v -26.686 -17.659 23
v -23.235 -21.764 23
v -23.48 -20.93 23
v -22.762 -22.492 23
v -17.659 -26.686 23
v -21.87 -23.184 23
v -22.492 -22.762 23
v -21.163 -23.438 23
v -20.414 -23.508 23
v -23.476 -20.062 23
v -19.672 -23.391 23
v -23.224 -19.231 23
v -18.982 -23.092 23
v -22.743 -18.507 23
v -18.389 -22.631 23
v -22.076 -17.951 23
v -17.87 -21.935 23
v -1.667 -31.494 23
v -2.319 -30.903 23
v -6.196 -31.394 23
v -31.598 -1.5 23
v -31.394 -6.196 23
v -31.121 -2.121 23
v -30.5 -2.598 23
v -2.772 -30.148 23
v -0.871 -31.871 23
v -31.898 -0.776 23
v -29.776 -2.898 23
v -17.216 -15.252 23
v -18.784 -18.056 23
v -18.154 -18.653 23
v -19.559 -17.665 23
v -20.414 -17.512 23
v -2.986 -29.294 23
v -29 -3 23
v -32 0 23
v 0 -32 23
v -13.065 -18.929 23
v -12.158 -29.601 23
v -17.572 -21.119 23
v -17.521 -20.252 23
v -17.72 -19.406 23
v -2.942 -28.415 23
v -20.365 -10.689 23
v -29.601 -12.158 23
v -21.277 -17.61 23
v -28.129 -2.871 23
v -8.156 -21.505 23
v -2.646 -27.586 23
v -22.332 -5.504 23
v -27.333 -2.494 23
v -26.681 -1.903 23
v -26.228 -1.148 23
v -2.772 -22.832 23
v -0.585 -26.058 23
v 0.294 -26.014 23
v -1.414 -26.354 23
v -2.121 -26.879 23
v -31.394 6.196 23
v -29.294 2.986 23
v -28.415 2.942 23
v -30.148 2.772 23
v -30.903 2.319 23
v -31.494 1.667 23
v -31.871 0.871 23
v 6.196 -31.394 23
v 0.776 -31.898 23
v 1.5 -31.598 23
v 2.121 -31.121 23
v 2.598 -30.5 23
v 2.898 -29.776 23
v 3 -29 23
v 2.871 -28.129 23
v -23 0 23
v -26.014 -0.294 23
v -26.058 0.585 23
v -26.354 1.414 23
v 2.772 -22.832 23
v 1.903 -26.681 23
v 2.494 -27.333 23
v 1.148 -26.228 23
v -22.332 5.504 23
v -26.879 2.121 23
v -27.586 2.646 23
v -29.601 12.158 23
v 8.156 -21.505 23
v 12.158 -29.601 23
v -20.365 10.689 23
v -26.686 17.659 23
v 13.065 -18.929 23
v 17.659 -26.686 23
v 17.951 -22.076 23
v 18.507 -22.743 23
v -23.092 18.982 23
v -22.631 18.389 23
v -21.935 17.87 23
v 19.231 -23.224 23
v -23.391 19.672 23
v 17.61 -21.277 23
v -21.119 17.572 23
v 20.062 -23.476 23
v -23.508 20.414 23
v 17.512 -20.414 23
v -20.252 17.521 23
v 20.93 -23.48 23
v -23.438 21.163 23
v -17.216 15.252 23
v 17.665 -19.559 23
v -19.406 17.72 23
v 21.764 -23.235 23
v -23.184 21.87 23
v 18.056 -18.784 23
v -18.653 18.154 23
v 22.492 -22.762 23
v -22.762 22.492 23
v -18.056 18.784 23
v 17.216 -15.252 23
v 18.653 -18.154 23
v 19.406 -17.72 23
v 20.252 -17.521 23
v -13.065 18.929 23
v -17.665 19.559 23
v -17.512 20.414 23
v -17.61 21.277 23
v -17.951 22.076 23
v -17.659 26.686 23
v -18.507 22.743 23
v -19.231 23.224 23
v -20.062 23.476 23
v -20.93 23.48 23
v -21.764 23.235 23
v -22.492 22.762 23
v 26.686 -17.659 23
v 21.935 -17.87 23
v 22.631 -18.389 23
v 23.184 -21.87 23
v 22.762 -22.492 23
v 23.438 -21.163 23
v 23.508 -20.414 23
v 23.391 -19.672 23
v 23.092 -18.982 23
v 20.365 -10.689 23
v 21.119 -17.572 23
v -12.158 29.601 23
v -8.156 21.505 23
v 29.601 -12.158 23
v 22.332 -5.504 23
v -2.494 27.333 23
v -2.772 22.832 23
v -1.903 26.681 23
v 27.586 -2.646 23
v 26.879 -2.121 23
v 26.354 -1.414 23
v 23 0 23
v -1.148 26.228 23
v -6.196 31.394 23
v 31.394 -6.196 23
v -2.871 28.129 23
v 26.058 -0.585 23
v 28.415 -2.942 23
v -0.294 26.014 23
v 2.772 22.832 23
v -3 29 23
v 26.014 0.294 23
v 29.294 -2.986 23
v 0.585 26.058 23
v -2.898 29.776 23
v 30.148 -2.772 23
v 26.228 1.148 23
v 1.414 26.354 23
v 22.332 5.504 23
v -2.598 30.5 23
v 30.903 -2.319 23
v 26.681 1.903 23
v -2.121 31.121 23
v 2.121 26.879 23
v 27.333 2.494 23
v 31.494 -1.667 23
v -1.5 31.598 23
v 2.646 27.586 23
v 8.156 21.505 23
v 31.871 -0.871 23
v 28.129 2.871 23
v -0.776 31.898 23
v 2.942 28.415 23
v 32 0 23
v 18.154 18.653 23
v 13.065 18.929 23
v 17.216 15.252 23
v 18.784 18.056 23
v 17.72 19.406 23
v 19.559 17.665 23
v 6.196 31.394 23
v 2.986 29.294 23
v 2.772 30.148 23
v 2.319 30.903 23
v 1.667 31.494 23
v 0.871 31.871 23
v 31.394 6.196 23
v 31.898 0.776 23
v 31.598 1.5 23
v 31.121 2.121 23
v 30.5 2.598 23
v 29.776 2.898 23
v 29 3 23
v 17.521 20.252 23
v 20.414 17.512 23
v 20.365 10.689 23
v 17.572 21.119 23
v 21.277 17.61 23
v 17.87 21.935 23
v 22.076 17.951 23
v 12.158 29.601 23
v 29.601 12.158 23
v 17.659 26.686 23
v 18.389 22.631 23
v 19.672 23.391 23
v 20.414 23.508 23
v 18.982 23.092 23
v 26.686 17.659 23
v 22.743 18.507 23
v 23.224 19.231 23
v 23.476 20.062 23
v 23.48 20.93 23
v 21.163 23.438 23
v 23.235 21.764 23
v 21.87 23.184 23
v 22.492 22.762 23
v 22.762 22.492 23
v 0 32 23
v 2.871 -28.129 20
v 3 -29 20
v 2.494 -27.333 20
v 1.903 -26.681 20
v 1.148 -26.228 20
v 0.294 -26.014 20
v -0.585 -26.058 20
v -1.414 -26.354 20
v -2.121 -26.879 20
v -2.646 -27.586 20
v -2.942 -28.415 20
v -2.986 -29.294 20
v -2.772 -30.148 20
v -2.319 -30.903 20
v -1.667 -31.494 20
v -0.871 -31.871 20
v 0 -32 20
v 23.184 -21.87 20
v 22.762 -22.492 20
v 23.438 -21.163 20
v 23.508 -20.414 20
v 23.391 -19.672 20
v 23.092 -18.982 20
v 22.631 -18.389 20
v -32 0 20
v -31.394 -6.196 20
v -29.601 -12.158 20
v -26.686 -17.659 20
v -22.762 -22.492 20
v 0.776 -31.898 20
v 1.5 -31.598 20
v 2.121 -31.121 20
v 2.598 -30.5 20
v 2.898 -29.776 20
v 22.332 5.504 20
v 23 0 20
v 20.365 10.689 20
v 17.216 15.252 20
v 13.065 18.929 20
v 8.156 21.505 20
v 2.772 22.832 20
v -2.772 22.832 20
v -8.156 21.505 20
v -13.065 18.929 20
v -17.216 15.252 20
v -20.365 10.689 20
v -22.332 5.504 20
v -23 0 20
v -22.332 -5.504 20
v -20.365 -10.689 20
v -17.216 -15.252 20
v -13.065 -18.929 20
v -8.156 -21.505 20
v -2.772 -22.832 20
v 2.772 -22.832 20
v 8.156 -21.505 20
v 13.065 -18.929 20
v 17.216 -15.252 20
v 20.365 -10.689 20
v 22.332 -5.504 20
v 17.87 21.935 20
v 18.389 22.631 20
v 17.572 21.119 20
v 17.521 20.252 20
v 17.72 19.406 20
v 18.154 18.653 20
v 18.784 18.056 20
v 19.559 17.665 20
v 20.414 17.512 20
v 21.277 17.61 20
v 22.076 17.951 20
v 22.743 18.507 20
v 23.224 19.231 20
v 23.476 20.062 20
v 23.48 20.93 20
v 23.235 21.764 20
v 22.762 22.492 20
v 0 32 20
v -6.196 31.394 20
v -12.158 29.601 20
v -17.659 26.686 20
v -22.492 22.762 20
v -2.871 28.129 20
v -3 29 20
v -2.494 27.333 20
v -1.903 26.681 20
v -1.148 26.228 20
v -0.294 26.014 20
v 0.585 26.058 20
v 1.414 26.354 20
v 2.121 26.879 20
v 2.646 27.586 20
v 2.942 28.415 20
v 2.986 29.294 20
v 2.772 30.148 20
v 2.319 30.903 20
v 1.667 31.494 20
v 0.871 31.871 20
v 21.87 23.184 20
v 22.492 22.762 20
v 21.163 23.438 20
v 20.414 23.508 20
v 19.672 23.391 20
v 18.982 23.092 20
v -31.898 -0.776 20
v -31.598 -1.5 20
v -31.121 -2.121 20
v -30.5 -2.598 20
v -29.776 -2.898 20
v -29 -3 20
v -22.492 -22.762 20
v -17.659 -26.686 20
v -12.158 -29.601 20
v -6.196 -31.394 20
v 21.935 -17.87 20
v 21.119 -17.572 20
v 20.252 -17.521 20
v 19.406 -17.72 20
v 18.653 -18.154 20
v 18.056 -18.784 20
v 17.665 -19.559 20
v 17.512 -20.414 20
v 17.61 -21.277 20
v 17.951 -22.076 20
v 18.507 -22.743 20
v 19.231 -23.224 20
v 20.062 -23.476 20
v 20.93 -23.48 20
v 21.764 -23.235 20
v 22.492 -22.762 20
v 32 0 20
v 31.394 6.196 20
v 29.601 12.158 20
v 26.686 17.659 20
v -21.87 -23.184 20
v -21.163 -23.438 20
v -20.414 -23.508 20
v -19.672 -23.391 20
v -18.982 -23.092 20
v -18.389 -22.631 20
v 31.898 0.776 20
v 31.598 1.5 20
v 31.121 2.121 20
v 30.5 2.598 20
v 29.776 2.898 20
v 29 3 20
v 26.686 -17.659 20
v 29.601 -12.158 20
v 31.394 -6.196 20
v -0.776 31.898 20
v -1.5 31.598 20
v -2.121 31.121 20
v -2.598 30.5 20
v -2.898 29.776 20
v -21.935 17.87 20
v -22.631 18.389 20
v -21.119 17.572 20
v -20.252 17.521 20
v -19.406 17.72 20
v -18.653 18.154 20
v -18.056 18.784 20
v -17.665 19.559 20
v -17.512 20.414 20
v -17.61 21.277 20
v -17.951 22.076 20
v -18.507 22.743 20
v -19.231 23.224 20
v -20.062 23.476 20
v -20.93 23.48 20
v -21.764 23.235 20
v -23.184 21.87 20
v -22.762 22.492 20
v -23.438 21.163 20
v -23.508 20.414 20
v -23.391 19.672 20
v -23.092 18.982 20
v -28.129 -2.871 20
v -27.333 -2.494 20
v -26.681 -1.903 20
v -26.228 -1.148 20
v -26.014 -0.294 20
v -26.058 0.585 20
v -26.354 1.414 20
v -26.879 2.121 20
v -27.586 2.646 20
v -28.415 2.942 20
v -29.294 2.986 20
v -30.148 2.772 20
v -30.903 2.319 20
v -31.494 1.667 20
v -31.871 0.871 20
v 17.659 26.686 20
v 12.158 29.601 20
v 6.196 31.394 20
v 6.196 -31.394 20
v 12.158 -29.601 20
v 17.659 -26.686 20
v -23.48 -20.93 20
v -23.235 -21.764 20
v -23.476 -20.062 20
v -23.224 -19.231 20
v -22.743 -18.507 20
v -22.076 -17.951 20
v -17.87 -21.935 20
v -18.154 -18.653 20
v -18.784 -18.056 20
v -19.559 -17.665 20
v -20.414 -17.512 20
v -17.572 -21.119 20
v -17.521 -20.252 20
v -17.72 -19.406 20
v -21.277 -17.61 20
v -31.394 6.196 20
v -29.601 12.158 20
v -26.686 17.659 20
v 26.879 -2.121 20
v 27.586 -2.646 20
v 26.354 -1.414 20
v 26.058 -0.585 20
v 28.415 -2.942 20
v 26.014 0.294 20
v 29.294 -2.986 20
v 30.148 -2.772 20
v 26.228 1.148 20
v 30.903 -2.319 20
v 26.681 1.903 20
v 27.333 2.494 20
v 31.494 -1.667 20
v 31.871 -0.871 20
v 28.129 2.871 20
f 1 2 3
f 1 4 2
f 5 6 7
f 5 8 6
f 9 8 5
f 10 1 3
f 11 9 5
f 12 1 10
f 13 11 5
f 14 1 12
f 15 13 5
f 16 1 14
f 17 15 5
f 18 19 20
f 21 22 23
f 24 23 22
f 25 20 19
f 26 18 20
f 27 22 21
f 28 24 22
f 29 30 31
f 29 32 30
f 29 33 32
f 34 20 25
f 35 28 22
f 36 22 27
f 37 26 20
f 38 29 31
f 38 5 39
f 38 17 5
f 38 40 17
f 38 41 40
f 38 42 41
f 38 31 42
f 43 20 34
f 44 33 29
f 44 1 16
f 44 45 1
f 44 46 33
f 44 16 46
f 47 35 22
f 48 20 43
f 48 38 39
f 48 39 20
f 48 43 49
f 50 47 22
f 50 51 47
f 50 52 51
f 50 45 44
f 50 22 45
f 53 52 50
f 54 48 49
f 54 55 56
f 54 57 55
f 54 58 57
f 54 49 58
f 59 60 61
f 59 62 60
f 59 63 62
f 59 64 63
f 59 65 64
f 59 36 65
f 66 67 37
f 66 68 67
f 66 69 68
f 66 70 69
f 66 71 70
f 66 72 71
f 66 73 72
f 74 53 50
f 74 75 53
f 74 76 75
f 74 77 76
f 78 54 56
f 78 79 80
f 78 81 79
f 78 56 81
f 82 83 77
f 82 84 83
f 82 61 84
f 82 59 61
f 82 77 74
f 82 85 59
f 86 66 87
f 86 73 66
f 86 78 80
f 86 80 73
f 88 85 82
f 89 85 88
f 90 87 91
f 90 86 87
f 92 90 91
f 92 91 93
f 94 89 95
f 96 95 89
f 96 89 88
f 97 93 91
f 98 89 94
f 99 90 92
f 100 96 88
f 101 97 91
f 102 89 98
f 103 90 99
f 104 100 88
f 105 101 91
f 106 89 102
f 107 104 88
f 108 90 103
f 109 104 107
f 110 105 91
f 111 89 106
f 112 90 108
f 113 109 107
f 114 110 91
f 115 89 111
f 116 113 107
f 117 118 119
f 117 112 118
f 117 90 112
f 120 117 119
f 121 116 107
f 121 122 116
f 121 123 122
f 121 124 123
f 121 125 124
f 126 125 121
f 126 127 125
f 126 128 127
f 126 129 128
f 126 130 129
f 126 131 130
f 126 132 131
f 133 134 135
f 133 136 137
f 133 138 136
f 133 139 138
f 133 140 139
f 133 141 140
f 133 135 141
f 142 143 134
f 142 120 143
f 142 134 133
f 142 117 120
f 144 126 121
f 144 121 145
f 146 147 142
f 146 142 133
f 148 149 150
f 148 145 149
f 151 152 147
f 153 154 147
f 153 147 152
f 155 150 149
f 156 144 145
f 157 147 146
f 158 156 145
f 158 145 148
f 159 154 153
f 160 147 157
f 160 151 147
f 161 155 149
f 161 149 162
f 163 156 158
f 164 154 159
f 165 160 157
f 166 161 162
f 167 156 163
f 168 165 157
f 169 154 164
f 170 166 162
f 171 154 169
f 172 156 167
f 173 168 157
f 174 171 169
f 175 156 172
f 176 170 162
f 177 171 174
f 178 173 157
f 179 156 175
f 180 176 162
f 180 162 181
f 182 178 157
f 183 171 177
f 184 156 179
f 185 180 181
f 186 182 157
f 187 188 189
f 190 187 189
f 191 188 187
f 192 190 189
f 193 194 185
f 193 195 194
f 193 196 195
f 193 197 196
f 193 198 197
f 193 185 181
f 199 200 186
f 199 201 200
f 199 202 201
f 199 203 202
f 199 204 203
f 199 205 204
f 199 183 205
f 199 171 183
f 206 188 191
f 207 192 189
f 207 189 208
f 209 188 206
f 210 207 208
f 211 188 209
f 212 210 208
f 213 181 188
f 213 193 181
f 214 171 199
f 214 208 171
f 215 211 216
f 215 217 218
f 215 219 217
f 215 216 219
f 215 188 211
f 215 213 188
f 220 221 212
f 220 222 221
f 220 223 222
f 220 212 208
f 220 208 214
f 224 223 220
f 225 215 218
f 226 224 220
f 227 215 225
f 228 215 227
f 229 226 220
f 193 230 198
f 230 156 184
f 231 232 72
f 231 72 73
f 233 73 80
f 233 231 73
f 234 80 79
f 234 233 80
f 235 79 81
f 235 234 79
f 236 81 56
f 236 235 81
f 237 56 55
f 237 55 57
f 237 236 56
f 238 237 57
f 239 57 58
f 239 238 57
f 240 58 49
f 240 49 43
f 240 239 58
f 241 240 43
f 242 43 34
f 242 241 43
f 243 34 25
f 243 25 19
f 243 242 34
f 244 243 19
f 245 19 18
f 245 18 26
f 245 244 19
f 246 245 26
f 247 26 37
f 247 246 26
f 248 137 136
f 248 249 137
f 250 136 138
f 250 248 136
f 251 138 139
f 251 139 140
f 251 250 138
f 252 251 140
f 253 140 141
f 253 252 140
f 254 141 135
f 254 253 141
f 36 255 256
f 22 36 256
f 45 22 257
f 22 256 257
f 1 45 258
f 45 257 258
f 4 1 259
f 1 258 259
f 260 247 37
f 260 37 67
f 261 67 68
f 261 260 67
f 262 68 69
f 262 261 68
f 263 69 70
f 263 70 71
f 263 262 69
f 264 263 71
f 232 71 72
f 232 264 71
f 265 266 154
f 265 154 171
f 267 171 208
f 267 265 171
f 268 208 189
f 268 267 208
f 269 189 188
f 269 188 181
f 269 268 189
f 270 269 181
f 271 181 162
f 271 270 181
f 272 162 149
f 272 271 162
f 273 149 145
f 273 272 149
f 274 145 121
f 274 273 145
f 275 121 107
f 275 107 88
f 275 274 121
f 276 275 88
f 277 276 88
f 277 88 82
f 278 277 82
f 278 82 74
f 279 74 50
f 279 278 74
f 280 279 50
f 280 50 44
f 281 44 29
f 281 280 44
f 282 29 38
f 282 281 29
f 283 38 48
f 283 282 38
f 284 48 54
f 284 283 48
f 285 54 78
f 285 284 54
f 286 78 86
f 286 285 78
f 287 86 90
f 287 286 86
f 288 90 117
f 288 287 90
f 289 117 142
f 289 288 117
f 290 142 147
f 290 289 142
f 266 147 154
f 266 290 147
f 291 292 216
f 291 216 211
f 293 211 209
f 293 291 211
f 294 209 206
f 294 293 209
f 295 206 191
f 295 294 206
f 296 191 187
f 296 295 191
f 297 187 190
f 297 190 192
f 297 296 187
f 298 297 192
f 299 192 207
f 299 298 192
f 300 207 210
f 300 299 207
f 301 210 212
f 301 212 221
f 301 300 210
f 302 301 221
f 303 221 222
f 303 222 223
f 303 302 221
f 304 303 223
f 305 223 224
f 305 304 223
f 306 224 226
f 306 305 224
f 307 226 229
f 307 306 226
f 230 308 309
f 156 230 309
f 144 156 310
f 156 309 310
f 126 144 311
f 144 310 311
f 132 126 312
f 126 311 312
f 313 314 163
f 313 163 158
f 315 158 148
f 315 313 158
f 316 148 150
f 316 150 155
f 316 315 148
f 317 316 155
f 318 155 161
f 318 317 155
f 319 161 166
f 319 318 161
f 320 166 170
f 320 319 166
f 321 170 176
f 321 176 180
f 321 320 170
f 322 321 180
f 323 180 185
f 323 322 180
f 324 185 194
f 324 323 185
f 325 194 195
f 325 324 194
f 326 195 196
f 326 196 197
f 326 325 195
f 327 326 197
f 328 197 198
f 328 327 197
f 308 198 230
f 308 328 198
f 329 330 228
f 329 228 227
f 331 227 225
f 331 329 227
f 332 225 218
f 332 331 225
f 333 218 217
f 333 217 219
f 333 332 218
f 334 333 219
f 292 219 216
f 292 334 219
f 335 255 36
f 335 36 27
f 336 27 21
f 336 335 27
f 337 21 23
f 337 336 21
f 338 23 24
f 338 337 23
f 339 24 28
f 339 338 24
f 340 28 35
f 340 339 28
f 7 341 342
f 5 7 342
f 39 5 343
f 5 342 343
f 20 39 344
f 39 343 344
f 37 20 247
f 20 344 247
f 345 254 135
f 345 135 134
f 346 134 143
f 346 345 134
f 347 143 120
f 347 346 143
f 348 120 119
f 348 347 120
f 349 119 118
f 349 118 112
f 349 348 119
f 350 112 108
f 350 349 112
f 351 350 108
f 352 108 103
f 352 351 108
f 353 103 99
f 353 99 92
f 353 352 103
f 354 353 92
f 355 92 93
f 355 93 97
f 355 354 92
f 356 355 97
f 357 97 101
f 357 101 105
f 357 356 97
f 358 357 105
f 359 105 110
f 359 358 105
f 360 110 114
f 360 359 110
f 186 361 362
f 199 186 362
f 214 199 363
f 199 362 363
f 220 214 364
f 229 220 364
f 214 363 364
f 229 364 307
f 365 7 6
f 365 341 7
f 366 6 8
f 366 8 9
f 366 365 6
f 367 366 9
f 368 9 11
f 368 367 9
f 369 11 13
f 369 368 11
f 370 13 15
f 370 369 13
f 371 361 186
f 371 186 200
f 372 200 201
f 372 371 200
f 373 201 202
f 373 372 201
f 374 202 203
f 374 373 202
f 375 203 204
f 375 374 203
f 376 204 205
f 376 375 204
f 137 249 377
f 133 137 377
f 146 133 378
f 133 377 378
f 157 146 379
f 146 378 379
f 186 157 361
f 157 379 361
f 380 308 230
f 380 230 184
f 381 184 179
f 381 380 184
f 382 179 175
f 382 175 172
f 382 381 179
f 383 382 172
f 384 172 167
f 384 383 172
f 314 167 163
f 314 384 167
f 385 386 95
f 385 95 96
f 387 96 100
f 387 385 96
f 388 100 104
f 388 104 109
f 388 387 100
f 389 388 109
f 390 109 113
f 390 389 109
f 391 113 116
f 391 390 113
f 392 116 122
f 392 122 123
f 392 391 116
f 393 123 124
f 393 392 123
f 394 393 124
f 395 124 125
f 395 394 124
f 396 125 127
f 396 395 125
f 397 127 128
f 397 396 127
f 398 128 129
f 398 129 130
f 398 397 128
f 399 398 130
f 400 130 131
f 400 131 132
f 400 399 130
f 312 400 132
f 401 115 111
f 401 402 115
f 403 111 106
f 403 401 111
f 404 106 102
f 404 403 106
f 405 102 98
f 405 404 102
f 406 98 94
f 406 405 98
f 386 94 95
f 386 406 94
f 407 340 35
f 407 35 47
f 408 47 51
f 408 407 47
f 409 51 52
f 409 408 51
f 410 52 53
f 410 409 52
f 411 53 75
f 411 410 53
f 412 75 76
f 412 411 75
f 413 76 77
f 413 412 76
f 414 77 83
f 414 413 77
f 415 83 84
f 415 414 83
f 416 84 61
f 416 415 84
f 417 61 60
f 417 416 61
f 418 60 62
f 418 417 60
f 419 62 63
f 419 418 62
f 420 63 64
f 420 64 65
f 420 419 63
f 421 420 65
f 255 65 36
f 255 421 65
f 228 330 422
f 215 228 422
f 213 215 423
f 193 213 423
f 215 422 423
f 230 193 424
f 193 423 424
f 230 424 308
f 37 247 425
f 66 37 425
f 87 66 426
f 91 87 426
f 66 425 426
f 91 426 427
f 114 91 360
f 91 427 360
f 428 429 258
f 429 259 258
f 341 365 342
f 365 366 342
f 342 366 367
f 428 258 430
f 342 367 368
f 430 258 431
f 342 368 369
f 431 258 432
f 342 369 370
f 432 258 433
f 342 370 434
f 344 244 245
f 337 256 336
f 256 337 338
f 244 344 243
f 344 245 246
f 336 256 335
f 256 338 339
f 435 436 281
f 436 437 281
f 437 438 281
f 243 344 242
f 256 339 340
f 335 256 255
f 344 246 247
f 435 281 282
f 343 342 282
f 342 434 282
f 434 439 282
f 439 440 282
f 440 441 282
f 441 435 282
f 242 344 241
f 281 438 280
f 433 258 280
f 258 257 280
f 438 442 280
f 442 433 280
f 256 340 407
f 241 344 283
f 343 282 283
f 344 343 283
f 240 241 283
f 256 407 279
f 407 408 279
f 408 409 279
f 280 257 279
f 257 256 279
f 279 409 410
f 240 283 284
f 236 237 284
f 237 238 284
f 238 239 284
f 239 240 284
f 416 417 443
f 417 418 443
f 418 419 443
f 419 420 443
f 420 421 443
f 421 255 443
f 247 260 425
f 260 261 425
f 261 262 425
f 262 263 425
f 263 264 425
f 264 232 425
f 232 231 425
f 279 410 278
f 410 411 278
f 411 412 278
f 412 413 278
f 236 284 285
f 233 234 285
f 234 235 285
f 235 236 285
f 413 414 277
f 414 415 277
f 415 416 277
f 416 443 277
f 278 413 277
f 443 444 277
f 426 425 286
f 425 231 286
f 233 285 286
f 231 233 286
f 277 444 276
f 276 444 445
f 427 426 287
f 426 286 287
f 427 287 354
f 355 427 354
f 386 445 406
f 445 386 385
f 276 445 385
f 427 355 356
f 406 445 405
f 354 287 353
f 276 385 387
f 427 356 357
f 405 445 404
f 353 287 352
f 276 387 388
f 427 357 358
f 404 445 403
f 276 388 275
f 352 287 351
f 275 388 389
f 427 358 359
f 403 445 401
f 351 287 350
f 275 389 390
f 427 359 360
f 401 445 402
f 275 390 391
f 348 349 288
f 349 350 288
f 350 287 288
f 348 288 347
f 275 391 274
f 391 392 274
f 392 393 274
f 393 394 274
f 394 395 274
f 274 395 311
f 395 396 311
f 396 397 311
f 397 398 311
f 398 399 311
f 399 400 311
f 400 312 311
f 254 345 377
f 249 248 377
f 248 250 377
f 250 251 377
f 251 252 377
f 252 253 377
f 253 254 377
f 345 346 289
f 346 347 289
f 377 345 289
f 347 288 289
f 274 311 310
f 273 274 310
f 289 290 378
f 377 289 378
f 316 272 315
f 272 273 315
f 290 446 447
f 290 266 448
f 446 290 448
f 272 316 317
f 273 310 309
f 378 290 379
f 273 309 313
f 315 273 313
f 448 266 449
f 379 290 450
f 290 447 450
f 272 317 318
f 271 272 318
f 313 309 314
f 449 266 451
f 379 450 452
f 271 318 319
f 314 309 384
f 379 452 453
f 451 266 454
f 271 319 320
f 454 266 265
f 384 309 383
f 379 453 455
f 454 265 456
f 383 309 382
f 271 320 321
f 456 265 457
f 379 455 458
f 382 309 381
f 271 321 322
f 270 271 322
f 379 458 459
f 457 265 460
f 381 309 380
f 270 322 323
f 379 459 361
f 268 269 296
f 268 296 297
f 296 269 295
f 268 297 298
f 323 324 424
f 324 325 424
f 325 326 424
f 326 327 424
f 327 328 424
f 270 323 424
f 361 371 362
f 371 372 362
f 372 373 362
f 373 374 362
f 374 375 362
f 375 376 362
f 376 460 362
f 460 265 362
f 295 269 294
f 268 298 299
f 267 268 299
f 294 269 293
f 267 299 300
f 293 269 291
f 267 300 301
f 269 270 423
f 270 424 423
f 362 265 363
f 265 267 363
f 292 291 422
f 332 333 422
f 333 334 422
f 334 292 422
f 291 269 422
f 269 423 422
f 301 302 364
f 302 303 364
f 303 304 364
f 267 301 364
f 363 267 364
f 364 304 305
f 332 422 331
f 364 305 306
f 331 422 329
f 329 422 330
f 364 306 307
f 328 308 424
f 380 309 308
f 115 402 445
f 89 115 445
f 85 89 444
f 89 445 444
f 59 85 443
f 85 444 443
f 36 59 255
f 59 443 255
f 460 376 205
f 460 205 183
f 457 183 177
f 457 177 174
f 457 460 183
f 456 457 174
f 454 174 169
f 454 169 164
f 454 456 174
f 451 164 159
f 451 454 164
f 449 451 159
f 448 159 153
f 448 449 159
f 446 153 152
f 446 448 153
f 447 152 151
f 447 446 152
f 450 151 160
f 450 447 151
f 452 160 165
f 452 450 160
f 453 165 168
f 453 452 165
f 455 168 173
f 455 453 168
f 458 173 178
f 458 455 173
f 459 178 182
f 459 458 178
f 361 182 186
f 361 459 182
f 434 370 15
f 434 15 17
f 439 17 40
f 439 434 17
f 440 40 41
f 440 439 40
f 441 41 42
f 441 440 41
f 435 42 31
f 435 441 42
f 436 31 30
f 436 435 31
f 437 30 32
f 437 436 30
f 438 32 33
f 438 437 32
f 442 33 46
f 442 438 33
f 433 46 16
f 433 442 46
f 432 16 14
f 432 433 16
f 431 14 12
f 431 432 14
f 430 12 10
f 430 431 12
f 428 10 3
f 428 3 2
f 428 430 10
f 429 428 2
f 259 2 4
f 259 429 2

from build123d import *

# Parameters (mm, degrees)
CYLINDER206_R               = 3
CYLINDER206_DEPTH           = 3
CYLINDER206_PLACEMENT_ANGLE = 45
CYLINDER203_R               = 3
CYLINDER203_DEPTH           = 3
CYLINDER205_R               = 3
CYLINDER205_DEPTH           = 3
CYLINDER205_PLACEMENT_ANGLE = 135
CYLINDER207_R               = 3
CYLINDER207_DEPTH           = 3
CYLINDER208_R               = 3
CYLINDER208_DEPTH           = 3
CYLINDER208_PLACEMENT_ANGLE = 225
CYLINDER209_R               = 3
CYLINDER209_DEPTH           = 3
CYLINDER210_R               = 3
CYLINDER210_DEPTH           = 3
CYLINDER210_PLACEMENT_ANGLE = 45
CYLINDER204_R               = 3
CYLINDER204_DEPTH           = 3
TUBE013_R                   = 32
TUBE013_R_2                 = 23
TUBE013_DEPTH               = 3


with BuildPart() as v_lec206:
    # Cylinder206 → Cylinder206 (new body)
    with BuildSketch(Plane.XY):
        Circle(CYLINDER206_R)
    extrude(amount=CYLINDER206_DEPTH)


with BuildPart() as v_lec206_1:
    # Cylinder206 placement: moved
    add(v_lec206.part.moved(Location((20.51, -20.51, 20))).rotate(Axis((20.51, -20.51, 20), (0, 0, 1)), CYLINDER206_PLACEMENT_ANGLE))


with BuildPart() as v_lec203:
    # Cylinder203 → Cylinder203 (new body)
    with BuildSketch(Plane(origin=(29, 0, 20), x_dir=(0, 1, 0), z_dir=(0, 0, 1))):
        Circle(CYLINDER203_R)
    extrude(amount=CYLINDER203_DEPTH)


with BuildPart() as v_lec205:
    # Cylinder205 → Cylinder205 (new body)
    with BuildSketch(Plane.XY):
        Circle(CYLINDER205_R)
    extrude(amount=CYLINDER205_DEPTH)


with BuildPart() as v_lec205_1:
    # Cylinder205 placement: moved
    add(v_lec205.part.moved(Location((20.51, 20.51, 20))).rotate(Axis((20.51, 20.51, 20), (0, 0, 1)), CYLINDER205_PLACEMENT_ANGLE))


with BuildPart() as v_lec207:
    # Cylinder207 → Cylinder207 (new body)
    with BuildSketch(Plane(origin=(0, 29, 20), x_dir=(-1, 0, 0), z_dir=(0, 0, 1))):
        Circle(CYLINDER207_R)
    extrude(amount=CYLINDER207_DEPTH)


with BuildPart() as v_lec208:
    # Cylinder208 → Cylinder208 (new body)
    with BuildSketch(Plane.XY):
        Circle(CYLINDER208_R)
    extrude(amount=CYLINDER208_DEPTH)


with BuildPart() as v_lec208_1:
    # Cylinder208 placement: moved
    add(v_lec208.part.moved(Location((-20.51, 20.51, 20))).rotate(Axis((-20.51, 20.51, 20), (0, 0, 1)), CYLINDER208_PLACEMENT_ANGLE))


with BuildPart() as v_lec209:
    # Cylinder209 → Cylinder209 (new body)
    with BuildSketch(Plane(origin=(-29, 0, 20), x_dir=(0, -1, 0), z_dir=(0, 0, 1))):
        Circle(CYLINDER209_R)
    extrude(amount=CYLINDER209_DEPTH)


with BuildPart() as v_lec210:
    # Cylinder210 → Cylinder210 (new body)
    with BuildSketch(Plane.XY):
        Circle(CYLINDER210_R)
    extrude(amount=CYLINDER210_DEPTH)


with BuildPart() as v_lec210_1:
    # Cylinder210 placement: moved
    add(v_lec210.part.moved(Location((-20.51, -20.51, 20))).rotate(Axis((-20.51, -20.51, 20), (0, 0, -1)), CYLINDER210_PLACEMENT_ANGLE))


with BuildPart() as compound546:
    # Cylinder204 → Cylinder204 (new body)
    with BuildSketch(Plane(origin=(0, -29, 20), x_dir=(1, 0, 0), z_dir=(0, 0, 1))):
        Circle(CYLINDER204_R)
    extrude(amount=CYLINDER204_DEPTH)

    # Compound546: union Válec206, Válec203, Válec205, Válec207, Válec208, Válec209, Válec210
    add(v_lec206_1.part)
    add(v_lec203.part)
    add(v_lec205_1.part)
    add(v_lec207.part)
    add(v_lec208_1.part)
    add(v_lec209.part)
    add(v_lec210_1.part)


with BuildPart() as cut320:
    # Tube013 → Tube013 (new body)
    with BuildSketch(Plane.XY.offset(20)):
        Circle(TUBE013_R)
        Circle(TUBE013_R_2, mode=Mode.SUBTRACT)
    extrude(amount=TUBE013_DEPTH)

    # Cut320: cut Compound546
    add(compound546.part, mode=Mode.SUBTRACT)


solid = cut320.part
